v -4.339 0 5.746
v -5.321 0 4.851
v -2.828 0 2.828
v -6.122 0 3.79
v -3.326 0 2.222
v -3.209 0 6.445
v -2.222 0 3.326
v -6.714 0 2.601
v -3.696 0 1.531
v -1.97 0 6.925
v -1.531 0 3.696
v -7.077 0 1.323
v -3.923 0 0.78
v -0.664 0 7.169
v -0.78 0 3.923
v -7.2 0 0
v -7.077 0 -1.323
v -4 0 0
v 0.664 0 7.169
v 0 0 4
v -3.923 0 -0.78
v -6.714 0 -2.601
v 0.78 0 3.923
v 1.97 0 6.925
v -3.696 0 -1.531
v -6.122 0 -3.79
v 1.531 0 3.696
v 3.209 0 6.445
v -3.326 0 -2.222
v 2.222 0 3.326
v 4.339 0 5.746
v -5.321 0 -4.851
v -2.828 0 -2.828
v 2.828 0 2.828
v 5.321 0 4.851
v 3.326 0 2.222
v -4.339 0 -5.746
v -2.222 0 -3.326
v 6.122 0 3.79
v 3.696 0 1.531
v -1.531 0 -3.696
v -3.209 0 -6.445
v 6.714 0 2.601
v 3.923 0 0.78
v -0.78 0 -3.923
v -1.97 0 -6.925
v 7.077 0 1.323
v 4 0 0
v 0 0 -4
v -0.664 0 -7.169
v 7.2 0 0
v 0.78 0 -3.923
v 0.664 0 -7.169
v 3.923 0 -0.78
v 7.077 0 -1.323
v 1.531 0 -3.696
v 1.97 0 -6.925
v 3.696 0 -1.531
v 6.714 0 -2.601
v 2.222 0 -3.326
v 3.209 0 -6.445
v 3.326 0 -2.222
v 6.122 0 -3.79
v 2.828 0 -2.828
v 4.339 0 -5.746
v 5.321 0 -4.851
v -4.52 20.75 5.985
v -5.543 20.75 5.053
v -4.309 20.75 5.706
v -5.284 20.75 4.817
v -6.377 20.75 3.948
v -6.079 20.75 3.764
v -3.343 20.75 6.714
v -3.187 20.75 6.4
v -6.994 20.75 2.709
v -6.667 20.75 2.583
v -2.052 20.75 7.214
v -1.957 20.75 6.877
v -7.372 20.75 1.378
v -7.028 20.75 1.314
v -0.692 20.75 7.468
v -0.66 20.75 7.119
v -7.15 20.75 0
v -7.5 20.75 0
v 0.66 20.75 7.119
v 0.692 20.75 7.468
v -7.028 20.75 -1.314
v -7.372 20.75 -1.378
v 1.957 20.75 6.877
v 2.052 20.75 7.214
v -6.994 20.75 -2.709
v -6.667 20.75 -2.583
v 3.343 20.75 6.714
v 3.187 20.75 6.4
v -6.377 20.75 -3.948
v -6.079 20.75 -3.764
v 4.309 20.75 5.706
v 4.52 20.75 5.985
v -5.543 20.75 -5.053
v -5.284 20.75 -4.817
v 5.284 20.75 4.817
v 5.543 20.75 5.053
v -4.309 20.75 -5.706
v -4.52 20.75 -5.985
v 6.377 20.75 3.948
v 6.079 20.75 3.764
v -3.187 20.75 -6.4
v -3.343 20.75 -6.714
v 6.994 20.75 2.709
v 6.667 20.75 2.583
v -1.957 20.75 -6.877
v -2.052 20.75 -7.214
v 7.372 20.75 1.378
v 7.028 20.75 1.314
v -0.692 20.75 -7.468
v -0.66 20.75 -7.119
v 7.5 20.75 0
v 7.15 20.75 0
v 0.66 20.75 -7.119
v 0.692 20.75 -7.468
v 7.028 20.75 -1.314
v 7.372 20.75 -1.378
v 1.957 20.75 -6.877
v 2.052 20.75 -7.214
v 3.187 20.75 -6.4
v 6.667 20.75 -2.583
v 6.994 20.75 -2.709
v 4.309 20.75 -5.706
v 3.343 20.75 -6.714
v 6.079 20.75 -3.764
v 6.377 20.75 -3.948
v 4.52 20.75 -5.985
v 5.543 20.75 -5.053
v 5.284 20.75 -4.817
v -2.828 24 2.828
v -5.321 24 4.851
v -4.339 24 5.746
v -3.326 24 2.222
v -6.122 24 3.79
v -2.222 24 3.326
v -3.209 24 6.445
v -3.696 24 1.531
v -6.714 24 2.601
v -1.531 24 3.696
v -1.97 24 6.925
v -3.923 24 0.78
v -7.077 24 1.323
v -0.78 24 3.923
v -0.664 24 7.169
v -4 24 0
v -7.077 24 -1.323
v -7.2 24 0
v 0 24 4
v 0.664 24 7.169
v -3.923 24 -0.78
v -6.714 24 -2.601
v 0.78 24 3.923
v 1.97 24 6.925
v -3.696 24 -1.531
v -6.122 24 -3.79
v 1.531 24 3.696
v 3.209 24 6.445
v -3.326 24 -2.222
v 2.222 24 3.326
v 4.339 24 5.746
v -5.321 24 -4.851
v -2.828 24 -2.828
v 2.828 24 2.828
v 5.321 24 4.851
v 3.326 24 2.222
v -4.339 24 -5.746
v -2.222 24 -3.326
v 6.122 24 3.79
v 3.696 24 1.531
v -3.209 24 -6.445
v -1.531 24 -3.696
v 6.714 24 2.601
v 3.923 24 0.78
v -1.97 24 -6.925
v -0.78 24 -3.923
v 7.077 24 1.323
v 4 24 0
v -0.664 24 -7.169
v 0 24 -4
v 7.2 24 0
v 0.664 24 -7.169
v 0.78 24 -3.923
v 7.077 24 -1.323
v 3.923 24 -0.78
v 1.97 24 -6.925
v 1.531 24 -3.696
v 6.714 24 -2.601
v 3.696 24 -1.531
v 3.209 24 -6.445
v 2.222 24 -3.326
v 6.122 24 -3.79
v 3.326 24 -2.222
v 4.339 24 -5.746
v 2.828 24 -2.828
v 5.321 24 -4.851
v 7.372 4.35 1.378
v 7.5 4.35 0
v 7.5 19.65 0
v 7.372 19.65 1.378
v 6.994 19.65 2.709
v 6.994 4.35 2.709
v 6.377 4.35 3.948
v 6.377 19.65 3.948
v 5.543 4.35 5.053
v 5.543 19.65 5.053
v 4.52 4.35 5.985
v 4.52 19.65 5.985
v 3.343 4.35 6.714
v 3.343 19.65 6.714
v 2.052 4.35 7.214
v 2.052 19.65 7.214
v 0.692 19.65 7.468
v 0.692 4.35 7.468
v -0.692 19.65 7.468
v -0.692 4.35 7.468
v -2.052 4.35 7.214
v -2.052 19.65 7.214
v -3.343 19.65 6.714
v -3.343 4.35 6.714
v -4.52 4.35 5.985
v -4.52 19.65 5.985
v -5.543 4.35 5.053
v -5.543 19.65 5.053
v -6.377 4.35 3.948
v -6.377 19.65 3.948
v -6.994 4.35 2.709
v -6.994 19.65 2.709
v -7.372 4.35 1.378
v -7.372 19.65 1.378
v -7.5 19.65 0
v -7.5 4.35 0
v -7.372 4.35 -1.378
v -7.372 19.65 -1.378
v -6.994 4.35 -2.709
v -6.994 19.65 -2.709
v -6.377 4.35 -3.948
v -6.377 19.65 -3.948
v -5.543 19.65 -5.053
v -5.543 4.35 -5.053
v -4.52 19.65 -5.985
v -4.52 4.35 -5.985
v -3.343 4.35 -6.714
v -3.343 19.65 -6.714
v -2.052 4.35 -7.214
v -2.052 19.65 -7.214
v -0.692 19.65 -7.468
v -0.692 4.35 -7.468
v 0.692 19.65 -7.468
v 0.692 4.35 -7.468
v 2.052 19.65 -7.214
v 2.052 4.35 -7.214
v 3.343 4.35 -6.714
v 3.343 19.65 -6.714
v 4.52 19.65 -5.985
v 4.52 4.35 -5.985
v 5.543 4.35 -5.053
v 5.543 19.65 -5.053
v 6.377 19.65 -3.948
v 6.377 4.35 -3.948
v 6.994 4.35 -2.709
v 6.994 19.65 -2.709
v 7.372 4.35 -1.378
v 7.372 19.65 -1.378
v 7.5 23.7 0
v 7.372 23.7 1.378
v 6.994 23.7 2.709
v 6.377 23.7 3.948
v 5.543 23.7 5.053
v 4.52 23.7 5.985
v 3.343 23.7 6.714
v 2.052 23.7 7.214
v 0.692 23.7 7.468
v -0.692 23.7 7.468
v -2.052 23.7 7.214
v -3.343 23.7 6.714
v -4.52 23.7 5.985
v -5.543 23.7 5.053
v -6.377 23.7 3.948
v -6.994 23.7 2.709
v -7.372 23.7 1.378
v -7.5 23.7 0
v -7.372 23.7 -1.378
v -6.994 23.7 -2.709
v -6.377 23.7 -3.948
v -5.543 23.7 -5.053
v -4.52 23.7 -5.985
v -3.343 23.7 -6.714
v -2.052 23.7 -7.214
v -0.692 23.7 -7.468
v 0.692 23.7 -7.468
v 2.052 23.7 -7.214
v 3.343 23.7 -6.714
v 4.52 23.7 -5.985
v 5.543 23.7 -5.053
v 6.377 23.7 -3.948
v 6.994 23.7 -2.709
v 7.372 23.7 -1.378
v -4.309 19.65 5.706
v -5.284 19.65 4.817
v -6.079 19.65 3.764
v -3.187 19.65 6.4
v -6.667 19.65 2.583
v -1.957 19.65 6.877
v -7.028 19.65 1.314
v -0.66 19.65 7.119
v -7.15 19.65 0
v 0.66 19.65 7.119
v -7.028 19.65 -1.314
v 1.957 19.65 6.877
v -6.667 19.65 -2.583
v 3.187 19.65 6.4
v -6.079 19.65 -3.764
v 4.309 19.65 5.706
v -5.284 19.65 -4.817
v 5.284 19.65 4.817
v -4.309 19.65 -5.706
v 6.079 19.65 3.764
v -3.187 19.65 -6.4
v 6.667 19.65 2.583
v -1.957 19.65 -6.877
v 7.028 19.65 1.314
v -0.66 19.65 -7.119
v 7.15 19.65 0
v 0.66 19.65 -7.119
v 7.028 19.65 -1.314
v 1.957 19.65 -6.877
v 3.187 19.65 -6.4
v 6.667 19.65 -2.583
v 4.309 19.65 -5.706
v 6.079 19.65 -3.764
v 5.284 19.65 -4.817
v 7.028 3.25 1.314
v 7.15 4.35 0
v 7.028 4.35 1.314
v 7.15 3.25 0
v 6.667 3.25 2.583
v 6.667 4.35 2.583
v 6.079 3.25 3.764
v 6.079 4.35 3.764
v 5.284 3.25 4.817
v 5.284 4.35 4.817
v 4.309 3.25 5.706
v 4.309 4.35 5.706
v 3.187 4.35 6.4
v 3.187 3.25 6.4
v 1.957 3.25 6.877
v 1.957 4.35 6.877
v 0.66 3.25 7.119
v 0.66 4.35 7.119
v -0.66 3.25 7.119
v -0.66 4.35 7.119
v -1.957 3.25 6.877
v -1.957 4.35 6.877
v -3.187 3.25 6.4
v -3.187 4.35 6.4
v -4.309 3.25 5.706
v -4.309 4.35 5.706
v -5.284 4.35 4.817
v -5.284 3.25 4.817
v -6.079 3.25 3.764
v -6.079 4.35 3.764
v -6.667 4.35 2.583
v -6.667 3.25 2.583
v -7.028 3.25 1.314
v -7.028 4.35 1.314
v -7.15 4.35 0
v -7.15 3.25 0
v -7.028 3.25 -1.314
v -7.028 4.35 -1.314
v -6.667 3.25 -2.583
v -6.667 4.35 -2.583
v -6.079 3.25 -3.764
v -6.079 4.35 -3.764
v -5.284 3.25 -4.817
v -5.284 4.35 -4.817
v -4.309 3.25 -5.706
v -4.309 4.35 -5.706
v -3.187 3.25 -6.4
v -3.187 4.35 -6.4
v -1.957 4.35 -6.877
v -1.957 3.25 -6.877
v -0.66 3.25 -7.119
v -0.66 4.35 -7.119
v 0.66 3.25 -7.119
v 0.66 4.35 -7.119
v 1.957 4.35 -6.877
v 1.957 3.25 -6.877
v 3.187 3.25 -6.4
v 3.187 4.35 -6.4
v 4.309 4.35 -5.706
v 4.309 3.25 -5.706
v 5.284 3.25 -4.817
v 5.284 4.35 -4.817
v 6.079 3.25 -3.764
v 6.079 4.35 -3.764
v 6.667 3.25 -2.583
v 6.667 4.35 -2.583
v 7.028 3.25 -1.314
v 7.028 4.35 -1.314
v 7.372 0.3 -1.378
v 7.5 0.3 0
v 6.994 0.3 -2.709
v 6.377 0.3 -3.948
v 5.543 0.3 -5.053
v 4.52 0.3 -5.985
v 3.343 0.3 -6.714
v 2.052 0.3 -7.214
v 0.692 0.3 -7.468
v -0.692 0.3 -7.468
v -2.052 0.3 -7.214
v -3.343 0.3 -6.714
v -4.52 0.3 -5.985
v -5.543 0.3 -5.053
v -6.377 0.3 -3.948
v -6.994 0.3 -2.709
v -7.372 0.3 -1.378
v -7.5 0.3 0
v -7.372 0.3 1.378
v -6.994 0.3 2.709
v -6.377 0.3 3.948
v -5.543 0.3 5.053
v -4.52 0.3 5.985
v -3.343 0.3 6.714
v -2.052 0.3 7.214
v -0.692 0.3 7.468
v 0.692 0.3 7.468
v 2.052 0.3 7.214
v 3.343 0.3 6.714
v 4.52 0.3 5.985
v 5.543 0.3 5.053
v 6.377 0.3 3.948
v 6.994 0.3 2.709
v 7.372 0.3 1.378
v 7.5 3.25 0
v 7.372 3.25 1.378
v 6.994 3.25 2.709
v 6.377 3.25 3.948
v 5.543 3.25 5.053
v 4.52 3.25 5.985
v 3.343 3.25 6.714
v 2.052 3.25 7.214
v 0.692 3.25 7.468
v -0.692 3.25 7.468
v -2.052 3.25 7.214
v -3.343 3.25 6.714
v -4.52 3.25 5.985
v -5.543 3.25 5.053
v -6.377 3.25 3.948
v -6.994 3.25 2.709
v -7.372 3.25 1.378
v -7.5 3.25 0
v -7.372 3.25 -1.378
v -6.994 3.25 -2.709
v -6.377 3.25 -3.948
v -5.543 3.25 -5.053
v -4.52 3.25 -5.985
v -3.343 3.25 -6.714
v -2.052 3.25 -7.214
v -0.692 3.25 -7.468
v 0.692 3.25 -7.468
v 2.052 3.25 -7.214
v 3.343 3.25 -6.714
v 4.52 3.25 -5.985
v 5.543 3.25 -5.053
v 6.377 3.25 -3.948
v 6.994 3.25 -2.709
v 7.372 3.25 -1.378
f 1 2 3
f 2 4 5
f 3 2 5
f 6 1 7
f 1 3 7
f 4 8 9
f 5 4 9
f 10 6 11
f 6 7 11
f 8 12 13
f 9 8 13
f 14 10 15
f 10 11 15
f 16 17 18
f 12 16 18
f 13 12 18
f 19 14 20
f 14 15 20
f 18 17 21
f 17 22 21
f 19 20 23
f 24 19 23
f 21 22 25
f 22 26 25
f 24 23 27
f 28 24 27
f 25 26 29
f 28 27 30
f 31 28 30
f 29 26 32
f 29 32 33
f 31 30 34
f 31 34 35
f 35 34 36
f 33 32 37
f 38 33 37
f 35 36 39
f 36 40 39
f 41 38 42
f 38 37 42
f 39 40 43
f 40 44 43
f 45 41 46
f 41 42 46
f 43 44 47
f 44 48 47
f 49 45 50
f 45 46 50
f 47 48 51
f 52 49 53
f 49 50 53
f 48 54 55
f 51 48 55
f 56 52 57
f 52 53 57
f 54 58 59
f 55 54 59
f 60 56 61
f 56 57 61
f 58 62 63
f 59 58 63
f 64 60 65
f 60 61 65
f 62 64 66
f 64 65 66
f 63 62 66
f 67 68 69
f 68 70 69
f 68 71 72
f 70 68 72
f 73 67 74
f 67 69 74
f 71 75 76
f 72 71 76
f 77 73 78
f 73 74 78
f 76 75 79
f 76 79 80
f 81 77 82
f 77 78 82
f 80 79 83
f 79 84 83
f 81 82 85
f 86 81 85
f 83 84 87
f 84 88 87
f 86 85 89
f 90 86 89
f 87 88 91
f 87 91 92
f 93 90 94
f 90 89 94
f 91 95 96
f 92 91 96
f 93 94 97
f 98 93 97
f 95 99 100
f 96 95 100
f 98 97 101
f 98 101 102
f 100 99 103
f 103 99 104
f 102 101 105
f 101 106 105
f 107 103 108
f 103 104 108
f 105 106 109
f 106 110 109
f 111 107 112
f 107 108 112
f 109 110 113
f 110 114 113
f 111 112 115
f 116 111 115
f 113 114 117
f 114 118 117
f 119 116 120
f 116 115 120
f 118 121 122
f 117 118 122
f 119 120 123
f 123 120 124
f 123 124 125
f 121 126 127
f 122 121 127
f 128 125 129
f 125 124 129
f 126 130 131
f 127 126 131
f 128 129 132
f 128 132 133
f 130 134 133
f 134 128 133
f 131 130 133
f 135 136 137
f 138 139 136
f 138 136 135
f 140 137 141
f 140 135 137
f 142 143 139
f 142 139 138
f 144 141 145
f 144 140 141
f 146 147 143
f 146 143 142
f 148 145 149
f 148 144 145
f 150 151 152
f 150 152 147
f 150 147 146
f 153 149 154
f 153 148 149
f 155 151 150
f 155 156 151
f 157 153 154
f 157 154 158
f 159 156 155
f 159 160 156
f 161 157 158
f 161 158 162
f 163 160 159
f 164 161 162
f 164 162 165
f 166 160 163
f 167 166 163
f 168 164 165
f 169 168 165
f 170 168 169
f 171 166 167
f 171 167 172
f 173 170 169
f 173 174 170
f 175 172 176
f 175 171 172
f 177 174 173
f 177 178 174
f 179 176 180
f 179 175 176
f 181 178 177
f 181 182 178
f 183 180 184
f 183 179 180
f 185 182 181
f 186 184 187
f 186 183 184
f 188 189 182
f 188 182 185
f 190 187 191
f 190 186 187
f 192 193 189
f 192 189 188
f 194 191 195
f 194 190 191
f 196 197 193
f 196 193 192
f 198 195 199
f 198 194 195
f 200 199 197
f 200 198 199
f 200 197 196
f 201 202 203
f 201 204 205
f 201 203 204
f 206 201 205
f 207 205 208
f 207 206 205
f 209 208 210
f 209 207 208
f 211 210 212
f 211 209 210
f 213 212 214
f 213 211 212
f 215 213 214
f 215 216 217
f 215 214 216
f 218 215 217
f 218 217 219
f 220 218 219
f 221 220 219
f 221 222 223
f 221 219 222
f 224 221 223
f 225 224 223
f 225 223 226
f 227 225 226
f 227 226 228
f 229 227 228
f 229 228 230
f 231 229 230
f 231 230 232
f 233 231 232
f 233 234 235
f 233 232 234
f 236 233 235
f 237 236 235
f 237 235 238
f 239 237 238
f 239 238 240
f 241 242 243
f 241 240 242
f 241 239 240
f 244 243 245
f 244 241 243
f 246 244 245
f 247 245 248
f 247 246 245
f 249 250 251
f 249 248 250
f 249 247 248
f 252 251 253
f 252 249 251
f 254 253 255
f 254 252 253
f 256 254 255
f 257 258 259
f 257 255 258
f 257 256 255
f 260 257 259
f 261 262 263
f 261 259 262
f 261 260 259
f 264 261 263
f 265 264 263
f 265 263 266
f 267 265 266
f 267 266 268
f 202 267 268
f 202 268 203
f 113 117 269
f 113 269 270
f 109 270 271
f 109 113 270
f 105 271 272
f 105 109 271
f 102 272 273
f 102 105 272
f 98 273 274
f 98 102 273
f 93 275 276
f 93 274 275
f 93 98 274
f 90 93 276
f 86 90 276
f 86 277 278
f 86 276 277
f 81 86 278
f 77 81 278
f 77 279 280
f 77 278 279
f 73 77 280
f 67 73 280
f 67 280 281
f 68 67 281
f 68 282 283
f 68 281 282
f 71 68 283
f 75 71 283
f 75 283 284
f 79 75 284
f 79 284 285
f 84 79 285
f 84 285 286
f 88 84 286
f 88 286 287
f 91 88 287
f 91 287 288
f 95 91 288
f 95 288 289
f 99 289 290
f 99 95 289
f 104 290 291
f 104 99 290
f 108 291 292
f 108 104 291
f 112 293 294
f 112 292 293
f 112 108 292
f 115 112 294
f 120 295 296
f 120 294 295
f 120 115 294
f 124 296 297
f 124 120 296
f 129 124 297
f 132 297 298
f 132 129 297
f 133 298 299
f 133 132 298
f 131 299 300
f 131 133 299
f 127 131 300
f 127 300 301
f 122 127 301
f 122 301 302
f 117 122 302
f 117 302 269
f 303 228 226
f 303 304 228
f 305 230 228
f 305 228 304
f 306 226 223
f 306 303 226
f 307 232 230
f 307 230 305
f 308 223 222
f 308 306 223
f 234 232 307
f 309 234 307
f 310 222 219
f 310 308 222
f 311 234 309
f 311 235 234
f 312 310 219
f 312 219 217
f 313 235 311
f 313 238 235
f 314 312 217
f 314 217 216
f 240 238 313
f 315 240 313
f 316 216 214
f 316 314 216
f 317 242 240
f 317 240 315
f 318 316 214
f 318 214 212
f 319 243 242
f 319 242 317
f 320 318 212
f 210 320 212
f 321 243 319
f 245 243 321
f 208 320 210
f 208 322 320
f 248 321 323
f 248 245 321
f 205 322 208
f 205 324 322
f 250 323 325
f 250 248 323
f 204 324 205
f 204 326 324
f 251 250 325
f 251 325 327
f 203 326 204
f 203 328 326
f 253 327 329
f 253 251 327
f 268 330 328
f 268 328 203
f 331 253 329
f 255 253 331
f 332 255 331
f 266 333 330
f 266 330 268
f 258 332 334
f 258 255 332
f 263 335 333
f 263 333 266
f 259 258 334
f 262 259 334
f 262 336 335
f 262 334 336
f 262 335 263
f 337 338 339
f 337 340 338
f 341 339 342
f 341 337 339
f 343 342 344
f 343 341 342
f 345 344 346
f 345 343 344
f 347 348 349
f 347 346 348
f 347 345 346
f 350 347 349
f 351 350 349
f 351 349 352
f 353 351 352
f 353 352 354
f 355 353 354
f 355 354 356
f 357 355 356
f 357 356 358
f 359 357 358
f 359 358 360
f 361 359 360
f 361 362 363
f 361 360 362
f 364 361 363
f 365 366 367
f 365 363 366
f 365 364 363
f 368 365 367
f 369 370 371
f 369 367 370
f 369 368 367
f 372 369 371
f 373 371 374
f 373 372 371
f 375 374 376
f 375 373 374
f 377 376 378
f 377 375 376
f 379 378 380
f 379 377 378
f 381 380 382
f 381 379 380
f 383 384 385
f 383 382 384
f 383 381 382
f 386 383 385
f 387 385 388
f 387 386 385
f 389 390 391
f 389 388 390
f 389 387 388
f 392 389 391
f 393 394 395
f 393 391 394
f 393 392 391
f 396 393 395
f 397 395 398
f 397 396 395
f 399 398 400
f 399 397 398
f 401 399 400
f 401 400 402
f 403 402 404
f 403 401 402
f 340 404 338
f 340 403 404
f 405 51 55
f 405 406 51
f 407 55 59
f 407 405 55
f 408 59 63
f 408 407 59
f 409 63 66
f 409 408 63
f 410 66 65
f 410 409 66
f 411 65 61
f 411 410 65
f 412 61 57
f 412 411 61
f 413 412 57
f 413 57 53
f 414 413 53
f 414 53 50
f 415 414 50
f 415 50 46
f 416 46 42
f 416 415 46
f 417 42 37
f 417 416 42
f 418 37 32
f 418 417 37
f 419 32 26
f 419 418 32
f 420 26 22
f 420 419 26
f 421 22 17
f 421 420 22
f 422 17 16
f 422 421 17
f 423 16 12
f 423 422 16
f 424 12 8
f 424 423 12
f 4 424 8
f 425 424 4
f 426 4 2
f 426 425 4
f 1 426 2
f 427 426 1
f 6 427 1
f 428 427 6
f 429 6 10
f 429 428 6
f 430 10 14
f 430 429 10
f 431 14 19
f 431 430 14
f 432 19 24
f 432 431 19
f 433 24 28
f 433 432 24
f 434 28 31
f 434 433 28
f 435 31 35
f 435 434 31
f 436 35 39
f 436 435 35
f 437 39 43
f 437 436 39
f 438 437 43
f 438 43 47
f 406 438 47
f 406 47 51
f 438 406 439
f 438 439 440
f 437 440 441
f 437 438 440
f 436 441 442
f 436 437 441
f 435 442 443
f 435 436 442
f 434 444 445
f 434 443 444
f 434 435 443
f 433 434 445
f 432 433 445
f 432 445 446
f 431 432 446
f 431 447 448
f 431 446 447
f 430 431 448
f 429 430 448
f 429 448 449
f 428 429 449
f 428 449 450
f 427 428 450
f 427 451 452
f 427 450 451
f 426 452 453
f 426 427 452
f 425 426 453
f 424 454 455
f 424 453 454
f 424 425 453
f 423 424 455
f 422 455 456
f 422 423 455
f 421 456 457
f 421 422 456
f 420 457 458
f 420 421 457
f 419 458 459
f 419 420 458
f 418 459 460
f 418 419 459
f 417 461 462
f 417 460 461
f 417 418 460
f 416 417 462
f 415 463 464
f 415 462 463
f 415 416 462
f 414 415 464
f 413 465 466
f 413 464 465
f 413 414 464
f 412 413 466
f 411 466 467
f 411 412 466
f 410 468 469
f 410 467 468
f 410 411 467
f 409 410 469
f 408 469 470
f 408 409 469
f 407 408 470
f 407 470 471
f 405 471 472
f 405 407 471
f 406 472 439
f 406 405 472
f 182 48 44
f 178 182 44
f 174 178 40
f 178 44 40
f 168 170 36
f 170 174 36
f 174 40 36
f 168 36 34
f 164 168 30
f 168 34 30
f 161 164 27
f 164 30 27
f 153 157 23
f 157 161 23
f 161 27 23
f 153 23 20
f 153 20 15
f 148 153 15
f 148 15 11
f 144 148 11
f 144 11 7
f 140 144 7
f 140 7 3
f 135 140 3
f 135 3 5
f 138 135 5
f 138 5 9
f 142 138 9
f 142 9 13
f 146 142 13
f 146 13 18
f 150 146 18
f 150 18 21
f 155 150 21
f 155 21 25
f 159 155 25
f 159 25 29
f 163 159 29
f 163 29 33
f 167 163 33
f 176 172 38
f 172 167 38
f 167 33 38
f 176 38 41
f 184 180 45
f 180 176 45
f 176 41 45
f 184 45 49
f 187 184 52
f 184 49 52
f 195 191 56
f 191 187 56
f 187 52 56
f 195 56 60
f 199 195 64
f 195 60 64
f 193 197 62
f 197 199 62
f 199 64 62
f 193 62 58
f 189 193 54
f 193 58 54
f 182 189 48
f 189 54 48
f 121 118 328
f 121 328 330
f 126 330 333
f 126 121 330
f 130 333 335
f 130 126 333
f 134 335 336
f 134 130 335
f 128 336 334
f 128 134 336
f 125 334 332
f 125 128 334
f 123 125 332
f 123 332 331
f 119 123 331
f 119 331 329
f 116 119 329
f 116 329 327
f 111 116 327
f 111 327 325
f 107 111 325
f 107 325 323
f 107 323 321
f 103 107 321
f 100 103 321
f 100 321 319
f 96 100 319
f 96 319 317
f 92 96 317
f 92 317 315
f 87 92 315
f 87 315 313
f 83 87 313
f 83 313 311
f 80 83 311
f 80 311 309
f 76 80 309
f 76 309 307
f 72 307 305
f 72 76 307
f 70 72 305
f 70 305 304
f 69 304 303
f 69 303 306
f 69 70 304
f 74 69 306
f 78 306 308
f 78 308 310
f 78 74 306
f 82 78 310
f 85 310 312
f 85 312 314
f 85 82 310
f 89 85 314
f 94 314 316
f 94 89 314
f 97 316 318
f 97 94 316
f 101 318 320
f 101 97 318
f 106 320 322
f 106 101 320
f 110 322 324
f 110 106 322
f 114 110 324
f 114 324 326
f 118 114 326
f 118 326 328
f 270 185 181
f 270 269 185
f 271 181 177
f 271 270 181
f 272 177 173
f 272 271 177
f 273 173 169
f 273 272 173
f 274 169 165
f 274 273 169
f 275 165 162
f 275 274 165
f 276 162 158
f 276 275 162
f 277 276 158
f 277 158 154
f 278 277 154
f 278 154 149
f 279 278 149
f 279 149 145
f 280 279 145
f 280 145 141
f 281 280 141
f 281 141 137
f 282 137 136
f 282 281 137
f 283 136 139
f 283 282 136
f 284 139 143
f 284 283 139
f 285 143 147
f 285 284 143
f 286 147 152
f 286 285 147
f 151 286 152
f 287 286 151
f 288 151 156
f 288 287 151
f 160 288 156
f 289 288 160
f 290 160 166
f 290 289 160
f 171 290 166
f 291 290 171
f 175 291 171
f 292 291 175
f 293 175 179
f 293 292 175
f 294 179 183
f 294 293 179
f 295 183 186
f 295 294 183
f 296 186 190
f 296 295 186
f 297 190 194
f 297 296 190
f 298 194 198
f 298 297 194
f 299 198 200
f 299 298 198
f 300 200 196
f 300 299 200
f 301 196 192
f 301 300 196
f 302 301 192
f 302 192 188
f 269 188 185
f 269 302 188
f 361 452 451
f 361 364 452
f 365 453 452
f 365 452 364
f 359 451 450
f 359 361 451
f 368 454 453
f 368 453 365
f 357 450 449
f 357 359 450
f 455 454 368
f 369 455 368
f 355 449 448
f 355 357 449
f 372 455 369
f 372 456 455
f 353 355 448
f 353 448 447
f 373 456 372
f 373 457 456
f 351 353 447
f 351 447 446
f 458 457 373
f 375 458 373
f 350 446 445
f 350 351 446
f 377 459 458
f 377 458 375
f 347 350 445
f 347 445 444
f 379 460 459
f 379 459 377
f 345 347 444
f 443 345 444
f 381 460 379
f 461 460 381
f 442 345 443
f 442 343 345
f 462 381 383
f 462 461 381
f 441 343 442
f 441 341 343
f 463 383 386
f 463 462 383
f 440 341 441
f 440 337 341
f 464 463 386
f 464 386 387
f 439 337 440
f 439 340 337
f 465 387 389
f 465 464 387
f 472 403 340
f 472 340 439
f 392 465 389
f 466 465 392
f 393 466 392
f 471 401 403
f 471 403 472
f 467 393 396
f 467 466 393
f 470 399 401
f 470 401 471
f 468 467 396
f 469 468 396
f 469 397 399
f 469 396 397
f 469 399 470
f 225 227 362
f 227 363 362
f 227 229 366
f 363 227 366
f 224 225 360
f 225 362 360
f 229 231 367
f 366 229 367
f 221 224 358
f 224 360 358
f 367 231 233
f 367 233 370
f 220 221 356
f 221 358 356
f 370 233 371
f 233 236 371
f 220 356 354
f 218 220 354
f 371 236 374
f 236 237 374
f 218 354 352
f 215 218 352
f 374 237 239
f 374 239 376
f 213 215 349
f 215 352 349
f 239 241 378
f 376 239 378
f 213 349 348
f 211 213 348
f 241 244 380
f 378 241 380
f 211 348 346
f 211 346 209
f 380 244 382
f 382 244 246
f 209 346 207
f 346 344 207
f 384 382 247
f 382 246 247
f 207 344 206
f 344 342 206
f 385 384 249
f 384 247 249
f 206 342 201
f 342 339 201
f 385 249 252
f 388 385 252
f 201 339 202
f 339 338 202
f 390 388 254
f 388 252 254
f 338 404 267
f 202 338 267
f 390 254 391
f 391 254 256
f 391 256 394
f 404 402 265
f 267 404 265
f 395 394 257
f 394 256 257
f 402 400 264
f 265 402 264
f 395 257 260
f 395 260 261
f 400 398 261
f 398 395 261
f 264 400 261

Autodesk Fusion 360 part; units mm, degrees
sketch "Sketch1" plane through (0, 0, 0) normal (0, 1, 0) x (1, 0, 0)
  circle A0 centre (0, 0) radius 4
  circle A1 centre (0, 0) radius 7.5
  circle A2 centre (0, 0) radius 7.15
  dimension "d1" = 8
  dimension "d2" = 15
  dimension "d6" = 0.35
extrude "Extrude1" add sketch "Sketch1" along normal blind 24 contours A1 | A2
extrude "Extrude2" cut sketch "Sketch1" along normal blind 1.1 from surface at 3.25 contours A1
extrude "Extrude3" cut sketch "Sketch1" against normal blind 1.1 from surface at 20.75 contours A1
chamfer "Chamfer1" distance 0.3 angle 45 2 edges at (-6.9925, 0, 2.7121) (-6.9925, 24, 2.7121)
